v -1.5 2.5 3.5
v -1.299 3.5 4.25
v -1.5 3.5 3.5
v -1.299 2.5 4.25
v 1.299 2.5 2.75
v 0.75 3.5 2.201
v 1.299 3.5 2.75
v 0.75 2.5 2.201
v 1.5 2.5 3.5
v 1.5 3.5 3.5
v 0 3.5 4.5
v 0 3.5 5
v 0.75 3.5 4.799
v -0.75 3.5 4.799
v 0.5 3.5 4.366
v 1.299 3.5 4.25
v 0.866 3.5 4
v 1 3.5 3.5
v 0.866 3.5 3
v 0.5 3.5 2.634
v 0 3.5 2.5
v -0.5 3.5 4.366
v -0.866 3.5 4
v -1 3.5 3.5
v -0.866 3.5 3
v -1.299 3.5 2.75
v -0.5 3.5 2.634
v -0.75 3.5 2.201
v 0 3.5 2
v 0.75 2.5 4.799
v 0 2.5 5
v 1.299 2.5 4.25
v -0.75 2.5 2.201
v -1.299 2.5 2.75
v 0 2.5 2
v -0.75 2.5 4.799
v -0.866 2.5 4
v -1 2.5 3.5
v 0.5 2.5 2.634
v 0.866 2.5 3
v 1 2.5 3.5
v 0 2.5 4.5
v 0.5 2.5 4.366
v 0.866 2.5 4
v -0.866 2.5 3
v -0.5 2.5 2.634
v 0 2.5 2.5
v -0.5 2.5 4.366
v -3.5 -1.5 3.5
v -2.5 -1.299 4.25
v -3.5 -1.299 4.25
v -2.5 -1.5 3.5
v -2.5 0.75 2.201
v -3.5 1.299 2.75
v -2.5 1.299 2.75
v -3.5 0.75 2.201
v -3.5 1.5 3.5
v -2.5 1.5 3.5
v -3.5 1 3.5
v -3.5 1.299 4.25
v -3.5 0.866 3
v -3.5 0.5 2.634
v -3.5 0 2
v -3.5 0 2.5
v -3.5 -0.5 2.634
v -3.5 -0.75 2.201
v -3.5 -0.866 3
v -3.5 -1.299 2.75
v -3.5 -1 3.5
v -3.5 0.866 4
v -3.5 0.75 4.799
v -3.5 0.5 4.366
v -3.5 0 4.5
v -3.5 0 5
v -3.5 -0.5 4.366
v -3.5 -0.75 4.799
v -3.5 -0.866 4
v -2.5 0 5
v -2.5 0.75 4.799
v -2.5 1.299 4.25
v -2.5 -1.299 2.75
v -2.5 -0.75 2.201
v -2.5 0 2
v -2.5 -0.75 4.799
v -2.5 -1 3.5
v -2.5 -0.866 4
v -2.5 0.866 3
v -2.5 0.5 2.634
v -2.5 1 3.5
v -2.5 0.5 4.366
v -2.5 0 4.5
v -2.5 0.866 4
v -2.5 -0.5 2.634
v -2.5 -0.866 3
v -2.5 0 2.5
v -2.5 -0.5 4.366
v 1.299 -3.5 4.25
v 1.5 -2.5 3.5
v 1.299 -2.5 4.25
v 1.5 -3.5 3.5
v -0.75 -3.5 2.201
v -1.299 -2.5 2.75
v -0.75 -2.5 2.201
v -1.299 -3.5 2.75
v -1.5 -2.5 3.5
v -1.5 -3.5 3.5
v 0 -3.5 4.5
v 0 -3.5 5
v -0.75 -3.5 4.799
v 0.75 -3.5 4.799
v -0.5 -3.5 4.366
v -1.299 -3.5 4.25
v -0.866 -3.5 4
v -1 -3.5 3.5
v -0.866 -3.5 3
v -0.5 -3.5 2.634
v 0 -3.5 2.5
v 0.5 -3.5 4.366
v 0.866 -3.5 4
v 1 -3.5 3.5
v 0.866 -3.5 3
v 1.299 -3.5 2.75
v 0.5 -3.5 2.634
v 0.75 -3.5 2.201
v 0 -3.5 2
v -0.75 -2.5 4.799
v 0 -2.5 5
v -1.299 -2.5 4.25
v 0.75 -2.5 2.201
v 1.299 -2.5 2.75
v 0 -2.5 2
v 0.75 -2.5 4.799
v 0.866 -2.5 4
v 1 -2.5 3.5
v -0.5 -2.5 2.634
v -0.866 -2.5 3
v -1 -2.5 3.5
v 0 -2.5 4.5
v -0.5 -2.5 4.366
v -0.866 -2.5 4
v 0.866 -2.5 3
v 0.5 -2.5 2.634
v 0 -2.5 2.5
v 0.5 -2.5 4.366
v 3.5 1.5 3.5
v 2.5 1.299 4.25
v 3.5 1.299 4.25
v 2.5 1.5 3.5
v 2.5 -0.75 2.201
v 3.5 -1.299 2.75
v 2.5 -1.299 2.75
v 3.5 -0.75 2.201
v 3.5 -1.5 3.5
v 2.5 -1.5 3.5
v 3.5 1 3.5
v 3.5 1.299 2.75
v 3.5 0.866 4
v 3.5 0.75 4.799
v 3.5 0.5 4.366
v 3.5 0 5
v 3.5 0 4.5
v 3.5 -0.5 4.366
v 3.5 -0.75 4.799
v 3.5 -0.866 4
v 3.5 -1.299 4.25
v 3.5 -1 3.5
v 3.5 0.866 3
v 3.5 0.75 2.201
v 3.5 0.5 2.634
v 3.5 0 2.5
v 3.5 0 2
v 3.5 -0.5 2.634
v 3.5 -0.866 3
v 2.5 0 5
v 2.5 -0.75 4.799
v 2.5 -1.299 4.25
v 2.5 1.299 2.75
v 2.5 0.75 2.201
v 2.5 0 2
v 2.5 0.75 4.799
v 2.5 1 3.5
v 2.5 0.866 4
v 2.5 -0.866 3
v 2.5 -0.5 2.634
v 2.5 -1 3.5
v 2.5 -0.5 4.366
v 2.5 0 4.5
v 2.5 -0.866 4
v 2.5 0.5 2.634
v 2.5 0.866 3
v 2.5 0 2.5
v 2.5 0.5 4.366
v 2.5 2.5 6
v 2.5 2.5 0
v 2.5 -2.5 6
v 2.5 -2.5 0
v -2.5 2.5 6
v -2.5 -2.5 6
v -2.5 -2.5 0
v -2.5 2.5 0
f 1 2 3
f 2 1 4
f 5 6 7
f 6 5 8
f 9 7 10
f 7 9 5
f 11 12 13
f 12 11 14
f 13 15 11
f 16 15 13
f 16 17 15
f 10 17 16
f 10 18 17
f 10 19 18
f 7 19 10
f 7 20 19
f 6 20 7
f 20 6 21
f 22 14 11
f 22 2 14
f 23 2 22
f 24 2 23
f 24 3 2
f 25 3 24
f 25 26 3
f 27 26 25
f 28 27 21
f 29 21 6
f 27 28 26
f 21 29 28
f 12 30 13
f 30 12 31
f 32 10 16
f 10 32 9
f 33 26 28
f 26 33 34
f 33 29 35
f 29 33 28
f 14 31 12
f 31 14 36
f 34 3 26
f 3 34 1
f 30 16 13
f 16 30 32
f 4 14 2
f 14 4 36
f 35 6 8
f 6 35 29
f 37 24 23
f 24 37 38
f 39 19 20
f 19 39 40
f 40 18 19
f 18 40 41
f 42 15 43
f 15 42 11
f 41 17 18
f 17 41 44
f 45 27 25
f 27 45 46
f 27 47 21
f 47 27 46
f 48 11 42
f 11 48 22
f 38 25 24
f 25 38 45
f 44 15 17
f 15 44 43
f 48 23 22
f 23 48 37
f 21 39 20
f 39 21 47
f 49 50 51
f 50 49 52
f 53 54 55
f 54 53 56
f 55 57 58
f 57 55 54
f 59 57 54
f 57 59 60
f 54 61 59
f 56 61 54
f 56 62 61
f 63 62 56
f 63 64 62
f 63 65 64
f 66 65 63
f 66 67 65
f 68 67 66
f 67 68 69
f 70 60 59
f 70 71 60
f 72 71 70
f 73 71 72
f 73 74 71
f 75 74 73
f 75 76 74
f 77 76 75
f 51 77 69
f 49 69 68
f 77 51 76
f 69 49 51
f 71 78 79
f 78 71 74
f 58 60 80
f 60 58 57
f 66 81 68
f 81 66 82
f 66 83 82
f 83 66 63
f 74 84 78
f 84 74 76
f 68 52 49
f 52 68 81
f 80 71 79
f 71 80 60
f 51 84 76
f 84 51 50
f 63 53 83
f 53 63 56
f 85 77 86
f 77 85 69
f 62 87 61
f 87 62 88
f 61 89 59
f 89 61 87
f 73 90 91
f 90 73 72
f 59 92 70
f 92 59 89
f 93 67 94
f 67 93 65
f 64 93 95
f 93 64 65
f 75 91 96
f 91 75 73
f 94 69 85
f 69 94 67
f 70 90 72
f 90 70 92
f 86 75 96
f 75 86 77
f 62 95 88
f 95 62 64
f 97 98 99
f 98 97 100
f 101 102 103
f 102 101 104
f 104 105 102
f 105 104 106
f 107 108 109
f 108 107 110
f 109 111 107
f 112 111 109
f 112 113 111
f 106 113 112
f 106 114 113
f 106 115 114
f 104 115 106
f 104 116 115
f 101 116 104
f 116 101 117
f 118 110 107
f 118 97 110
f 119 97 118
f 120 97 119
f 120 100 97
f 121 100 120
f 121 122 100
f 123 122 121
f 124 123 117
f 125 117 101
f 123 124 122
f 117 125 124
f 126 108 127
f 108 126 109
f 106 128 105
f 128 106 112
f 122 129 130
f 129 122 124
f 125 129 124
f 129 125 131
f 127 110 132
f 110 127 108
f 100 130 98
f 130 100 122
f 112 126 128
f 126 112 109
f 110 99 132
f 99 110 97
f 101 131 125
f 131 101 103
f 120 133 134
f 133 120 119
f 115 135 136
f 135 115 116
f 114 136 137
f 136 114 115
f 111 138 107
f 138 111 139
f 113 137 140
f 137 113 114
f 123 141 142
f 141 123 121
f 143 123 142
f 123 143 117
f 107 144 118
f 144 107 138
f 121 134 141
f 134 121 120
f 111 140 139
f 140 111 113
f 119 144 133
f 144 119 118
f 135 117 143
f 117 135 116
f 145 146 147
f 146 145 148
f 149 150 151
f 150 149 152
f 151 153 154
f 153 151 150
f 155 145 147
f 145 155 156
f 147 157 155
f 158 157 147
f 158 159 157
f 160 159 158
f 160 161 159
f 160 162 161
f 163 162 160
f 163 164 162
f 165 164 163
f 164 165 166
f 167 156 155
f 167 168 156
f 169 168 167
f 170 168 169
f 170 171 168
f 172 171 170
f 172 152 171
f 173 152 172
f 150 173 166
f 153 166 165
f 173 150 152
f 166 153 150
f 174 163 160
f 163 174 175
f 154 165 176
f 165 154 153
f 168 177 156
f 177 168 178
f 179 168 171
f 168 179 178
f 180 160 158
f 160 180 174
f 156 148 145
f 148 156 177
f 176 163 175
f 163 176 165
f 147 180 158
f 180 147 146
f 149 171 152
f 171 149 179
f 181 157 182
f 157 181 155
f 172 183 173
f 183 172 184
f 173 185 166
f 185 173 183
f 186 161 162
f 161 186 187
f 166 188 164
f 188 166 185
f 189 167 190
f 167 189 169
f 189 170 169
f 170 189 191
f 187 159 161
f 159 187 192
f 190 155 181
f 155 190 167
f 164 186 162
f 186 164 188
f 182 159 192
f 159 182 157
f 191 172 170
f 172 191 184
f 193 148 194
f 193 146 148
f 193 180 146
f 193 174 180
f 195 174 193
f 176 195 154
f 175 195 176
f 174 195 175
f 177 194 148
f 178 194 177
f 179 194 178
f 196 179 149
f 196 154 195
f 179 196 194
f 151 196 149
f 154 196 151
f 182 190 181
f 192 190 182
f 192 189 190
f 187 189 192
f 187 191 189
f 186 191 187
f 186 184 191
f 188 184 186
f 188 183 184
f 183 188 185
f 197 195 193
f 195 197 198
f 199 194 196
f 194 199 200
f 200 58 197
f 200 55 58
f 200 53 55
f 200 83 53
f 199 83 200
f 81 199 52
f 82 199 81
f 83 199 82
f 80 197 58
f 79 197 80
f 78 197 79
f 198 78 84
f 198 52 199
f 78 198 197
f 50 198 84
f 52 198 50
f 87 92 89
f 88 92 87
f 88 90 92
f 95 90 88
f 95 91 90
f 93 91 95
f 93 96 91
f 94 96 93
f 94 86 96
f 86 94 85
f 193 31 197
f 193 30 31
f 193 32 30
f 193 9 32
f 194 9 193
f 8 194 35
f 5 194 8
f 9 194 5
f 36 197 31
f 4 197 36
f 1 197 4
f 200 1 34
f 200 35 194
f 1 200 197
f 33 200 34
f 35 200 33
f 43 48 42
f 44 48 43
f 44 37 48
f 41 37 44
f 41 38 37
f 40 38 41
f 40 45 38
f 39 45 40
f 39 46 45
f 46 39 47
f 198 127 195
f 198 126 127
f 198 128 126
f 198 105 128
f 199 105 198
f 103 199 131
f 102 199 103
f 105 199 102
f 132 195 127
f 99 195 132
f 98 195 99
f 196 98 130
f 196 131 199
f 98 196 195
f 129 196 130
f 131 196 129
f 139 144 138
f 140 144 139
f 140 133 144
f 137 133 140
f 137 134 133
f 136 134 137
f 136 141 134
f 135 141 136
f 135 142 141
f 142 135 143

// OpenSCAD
// brick 1x1 4 side stud w holes

// external vars #########################

// part ##################################

module brick_1x1_4_side_stud_w_holes() {
  $fn = 12;
  difference() {
    union() {
      translate([-2.5,-2.5,0]) cube([5,5,6],center=false);
      for (i = [0:3]) {
        rotate([0,0,90*i]) difference() {
          translate([0,2,3.5]) rotate([-90,0,0]) cylinder(h=1.5,d=3);
          translate([0,2,3.5]) rotate([-90,0,0]) cylinder(h=1.7,d=2);
        }
      }
    }
  }
}

brick_1x1_4_side_stud_w_holes();
